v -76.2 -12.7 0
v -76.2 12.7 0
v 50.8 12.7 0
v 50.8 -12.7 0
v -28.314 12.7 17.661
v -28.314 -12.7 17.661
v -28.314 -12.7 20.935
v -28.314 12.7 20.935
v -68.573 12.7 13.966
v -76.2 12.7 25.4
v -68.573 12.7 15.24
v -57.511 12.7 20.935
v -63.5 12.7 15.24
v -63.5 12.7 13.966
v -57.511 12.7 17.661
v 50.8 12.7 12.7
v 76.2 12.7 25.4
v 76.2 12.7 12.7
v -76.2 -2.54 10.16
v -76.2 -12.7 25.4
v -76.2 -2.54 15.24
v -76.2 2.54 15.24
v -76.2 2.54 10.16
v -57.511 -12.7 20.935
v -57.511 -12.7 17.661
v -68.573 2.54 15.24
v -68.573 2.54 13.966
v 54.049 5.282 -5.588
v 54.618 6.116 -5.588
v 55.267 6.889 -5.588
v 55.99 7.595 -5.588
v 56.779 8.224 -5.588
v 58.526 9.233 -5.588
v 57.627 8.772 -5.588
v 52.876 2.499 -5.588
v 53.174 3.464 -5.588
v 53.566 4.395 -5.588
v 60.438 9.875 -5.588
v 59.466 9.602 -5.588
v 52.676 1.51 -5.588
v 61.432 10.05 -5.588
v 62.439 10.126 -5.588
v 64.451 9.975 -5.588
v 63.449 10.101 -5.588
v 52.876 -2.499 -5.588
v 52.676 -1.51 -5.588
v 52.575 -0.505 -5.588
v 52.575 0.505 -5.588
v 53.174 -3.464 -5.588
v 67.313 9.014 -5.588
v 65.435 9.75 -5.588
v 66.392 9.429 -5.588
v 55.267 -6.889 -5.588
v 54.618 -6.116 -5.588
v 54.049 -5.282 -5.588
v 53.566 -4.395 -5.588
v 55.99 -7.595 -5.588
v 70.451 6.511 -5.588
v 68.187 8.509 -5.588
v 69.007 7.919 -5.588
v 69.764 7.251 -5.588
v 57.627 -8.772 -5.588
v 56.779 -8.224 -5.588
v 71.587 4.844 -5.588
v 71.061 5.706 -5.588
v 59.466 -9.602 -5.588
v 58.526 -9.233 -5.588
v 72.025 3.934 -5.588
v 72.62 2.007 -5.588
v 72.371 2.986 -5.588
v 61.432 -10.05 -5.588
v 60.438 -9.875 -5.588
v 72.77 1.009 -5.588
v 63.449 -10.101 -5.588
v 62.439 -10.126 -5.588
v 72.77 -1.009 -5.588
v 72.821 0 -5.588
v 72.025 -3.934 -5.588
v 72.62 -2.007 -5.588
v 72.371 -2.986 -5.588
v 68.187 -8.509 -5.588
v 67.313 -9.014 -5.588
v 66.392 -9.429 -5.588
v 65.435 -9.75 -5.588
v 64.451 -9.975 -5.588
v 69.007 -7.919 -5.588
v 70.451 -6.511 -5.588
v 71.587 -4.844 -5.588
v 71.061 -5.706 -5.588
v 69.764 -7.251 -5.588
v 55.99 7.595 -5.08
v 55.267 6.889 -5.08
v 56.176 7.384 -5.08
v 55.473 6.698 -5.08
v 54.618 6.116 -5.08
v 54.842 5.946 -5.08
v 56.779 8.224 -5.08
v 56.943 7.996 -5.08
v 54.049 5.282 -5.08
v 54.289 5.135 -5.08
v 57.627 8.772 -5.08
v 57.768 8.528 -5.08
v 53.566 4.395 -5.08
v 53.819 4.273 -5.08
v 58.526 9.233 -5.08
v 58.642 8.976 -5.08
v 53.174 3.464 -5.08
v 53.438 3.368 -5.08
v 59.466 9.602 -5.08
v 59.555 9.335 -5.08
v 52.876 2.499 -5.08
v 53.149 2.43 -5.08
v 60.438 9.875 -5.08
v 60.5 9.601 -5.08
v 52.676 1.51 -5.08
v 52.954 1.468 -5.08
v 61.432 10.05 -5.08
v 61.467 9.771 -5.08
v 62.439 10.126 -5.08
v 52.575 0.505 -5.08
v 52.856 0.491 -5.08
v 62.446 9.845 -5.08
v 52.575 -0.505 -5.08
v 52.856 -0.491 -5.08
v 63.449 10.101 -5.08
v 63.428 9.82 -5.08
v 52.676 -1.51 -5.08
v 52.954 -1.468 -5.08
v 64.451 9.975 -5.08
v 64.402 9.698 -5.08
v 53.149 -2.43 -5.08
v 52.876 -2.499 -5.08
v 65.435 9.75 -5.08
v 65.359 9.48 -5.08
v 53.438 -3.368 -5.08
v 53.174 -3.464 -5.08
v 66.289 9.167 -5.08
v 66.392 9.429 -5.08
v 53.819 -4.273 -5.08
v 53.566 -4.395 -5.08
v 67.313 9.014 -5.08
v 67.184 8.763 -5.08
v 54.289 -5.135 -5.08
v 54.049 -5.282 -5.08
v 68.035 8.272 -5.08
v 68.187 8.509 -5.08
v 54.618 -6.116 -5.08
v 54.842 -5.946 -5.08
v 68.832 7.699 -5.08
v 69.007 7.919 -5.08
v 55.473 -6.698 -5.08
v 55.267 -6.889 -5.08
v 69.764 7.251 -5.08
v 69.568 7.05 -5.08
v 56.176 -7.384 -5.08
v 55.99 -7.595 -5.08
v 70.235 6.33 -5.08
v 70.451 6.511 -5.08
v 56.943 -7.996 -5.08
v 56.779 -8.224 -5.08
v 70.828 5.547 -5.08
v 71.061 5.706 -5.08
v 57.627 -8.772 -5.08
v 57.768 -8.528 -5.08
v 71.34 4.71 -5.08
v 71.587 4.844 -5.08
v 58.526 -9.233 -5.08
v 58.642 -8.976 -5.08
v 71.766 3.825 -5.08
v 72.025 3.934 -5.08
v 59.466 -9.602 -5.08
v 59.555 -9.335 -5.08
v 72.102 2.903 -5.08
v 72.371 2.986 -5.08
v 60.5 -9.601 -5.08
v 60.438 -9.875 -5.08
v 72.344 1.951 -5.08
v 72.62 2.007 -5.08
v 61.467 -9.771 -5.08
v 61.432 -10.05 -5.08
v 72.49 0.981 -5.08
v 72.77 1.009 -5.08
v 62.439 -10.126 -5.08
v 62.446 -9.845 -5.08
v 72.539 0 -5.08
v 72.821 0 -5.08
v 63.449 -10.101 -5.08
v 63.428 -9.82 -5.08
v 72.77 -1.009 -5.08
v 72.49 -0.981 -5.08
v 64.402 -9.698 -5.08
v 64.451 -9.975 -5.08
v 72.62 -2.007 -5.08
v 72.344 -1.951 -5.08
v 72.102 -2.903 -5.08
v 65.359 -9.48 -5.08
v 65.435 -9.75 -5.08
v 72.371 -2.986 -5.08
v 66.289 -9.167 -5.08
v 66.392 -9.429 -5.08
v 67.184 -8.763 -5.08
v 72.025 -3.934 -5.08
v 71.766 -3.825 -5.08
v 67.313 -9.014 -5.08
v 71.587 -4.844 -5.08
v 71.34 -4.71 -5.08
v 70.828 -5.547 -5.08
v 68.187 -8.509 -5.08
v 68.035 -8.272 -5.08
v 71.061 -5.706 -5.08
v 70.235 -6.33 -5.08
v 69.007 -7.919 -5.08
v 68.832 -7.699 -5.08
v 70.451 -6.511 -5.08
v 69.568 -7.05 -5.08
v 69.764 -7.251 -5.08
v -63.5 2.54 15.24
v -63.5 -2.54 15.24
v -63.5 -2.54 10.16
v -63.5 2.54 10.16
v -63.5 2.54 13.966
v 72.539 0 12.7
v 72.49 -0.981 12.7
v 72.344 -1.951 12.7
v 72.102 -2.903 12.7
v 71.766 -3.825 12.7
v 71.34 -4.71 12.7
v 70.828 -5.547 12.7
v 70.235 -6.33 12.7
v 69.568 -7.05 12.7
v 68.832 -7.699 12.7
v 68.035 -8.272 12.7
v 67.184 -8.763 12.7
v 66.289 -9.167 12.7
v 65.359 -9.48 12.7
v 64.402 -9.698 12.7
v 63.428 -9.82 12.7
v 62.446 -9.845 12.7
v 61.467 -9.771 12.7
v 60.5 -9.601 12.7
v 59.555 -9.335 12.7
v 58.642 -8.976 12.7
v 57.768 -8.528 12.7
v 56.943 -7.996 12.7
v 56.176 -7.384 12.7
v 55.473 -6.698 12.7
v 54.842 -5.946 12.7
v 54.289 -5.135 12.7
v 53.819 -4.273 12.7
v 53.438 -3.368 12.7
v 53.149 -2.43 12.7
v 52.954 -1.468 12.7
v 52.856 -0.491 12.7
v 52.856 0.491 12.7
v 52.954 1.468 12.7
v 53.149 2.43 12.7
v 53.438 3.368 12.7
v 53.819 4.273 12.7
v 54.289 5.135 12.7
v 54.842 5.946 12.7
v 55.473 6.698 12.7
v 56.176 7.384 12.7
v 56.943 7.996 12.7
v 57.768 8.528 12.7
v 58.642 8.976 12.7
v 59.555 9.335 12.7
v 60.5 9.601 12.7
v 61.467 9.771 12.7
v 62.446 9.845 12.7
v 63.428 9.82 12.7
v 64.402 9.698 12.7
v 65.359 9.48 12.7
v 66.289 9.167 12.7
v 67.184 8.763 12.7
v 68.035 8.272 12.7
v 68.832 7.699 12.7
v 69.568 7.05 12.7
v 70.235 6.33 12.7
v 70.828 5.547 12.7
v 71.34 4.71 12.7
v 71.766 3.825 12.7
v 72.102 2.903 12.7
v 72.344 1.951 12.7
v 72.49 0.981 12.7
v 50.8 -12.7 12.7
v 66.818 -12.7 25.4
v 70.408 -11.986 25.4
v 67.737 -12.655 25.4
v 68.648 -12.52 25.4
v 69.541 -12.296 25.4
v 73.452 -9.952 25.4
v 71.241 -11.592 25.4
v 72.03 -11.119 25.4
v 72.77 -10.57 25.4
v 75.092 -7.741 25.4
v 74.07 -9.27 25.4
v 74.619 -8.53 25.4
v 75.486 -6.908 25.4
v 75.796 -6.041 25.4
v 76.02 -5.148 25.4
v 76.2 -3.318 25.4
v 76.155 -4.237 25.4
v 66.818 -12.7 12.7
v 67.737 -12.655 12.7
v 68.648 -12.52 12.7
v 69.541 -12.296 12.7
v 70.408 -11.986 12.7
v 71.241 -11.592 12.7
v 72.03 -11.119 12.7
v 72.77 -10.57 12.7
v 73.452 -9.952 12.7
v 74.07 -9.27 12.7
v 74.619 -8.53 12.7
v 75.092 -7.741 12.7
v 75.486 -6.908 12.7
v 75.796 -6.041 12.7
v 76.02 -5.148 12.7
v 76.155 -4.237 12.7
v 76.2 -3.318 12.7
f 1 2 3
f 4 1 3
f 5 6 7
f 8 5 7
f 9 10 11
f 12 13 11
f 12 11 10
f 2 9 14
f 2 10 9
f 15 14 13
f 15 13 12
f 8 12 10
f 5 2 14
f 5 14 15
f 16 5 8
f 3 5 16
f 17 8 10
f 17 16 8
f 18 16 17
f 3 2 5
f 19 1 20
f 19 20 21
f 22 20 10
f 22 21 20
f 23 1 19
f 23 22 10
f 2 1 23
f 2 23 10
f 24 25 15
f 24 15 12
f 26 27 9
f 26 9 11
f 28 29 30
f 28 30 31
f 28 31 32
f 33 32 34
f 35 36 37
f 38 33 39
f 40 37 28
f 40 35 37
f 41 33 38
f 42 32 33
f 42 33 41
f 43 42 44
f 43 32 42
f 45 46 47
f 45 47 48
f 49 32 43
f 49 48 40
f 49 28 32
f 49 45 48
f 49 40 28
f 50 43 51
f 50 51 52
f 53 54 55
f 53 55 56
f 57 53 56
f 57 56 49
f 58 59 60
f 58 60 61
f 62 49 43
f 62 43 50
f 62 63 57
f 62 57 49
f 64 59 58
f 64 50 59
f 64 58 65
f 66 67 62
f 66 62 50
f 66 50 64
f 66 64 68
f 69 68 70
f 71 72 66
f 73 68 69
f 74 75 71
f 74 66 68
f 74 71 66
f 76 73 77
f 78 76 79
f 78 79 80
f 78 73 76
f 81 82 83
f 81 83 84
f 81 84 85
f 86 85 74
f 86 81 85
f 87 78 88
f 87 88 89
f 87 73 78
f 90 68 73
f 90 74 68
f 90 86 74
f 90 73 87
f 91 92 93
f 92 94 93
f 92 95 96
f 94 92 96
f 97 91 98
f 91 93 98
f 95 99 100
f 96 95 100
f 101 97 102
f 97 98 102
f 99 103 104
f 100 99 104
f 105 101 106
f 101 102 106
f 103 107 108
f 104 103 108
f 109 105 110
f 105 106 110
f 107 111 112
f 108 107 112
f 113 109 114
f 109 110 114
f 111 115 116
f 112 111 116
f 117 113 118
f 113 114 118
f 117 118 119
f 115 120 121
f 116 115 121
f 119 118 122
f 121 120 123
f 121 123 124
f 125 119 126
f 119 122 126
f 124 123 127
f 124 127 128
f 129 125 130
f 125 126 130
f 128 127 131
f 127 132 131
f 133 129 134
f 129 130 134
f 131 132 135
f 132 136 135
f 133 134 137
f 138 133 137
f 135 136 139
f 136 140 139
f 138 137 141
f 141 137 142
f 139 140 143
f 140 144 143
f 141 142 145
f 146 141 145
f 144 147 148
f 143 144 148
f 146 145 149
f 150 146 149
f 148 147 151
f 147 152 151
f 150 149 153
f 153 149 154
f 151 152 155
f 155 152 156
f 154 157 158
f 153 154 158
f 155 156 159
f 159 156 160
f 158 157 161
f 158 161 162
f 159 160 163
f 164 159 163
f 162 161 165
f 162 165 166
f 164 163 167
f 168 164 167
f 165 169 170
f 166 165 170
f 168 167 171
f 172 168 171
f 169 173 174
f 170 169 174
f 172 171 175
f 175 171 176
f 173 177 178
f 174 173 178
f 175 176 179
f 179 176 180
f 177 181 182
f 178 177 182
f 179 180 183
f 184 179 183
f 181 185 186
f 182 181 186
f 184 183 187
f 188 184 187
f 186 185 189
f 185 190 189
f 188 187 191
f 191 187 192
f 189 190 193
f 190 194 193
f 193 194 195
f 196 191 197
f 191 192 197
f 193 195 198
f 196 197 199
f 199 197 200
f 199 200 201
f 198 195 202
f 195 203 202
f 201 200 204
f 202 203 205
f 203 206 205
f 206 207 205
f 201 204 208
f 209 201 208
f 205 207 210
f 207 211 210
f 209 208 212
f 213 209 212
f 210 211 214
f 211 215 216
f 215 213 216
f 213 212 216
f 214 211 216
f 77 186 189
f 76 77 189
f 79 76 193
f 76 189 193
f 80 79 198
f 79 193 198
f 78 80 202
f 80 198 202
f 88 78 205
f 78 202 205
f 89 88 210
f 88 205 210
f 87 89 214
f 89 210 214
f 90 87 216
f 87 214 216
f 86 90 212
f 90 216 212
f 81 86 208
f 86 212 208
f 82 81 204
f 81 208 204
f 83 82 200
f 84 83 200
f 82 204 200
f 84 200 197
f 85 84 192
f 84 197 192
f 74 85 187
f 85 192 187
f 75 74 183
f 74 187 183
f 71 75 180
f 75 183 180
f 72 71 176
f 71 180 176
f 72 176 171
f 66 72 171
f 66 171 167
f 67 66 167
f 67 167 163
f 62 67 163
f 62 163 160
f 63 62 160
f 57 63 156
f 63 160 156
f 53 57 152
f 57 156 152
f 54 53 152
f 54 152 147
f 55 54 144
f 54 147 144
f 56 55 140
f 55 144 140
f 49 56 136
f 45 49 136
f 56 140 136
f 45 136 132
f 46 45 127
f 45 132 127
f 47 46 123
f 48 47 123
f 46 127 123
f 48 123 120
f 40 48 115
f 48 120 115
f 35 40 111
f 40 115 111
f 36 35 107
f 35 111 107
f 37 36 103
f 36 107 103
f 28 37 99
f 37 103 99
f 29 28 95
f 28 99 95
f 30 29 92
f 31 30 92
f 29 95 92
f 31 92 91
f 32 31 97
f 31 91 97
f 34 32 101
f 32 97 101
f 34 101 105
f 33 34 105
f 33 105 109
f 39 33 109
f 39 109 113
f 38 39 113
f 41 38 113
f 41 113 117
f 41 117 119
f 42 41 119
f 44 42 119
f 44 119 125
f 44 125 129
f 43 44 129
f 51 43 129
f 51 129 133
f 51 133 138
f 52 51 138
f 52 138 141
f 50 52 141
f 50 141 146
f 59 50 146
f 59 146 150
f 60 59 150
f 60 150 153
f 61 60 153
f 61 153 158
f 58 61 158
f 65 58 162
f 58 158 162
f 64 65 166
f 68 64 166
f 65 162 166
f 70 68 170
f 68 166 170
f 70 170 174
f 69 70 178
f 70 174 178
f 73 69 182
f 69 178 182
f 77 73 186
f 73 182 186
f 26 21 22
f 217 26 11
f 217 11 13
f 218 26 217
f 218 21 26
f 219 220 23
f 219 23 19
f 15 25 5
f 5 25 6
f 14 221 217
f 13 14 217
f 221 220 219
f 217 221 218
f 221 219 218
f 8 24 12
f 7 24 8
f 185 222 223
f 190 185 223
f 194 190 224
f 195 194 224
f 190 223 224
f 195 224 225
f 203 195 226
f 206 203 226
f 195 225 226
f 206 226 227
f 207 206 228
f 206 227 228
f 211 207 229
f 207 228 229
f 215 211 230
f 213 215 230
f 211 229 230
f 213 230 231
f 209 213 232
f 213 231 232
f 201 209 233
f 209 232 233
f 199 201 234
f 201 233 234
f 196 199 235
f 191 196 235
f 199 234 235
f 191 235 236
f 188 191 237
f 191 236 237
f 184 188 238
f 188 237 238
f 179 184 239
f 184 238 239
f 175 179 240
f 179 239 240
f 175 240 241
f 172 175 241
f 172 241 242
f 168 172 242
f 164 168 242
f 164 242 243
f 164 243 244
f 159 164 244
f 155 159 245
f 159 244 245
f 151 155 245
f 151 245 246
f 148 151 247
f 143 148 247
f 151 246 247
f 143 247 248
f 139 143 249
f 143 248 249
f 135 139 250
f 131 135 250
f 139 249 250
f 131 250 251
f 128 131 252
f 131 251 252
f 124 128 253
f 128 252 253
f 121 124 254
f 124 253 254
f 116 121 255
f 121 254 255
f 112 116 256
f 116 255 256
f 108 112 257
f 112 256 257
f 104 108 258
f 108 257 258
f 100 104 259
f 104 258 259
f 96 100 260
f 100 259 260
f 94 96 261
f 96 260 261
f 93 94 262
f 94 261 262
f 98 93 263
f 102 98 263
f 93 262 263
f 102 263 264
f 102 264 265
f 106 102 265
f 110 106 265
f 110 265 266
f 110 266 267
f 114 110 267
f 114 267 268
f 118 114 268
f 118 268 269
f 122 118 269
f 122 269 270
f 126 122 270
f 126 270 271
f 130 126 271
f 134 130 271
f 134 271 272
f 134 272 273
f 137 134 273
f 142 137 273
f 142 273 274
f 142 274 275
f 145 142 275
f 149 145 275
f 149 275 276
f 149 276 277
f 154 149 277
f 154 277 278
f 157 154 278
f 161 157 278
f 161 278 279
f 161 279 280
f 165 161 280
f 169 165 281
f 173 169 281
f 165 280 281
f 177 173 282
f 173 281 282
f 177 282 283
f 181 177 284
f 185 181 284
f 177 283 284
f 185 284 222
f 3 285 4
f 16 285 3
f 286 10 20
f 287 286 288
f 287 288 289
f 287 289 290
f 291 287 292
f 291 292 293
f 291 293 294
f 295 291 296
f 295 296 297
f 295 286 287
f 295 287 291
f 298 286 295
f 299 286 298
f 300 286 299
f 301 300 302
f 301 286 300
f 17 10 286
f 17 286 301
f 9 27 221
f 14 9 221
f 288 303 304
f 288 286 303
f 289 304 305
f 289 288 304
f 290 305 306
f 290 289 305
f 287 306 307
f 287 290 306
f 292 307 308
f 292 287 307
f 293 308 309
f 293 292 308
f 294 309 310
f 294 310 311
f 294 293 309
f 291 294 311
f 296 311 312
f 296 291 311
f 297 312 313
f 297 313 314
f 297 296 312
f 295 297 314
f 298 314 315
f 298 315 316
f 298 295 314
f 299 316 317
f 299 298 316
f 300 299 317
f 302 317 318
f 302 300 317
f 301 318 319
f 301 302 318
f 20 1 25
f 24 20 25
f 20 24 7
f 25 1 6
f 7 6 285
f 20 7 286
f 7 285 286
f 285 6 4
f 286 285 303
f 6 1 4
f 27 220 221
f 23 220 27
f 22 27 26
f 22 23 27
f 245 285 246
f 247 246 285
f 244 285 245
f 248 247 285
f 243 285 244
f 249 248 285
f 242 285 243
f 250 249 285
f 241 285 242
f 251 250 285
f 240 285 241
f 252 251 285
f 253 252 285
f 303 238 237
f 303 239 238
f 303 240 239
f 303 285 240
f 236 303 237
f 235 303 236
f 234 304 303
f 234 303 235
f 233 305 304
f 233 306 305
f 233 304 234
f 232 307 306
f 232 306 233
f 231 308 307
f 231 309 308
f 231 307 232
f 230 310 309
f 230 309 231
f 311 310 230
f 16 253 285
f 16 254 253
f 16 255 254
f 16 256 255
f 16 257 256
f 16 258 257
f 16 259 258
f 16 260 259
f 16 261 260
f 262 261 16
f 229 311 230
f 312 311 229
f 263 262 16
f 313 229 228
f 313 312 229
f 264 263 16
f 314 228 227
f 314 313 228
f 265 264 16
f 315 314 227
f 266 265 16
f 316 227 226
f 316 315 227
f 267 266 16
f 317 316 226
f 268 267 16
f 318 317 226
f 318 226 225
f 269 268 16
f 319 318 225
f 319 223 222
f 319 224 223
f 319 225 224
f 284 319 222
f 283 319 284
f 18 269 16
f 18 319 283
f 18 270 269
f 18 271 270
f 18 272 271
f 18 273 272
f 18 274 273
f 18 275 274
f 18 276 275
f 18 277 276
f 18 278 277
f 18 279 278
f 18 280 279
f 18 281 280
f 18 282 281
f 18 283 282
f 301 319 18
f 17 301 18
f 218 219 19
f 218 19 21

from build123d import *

# Parameters (mm, degrees)
F0_W       = 152.4
F0_H       = 25.4
F1_DEPTH   = 25.4
F2_W       = 25.4
F2_H       = 16.7976804078
F4_DEPTH   = 3.4544
F5_W       = 25.4
F5_H       = 12.7
F6_DEPTH   = 25.4
F8_W       = 29.1976537555
F8_H       = 3.2747276127
F9_DEPTH   = 25.4
F10_R      = 9.3821167461
F7_R       = 9.84758
F11_DEPTH  = 17.78
F12_R      = 10.1290006818
F12_R_2    = 9.84758
F11_FACE_R = 9.84758
F13_DEPTH  = 0.508
F14_W      = 5.08
F14_H      = 5.08
F15_DEPTH  = 12.7
F16_W      = 5.0729980469
F16_H      = 1.2744938934
F17_DEPTH  = 12.7


with BuildPart() as f1:
    # F0 (on Top) → F1 (new body)
    with BuildSketch(Plane.XY):
        Rectangle(F0_W, F0_H)
    extrude(amount=F1_DEPTH)

    # F2 (on face) → F4 (join)
    with BuildSketch(Plane.YZ.offset(76.2)):
        with Locations((0, 8.3988402039)):
            Rectangle(F2_W, F2_H)
    extrude(amount=-F4_DEPTH)

    # F5 (on face) → F6 (cut)
    with BuildSketch(Plane.YZ.offset(76.2)):
        with Locations((0, 6.35)):
            Rectangle(F5_W, F5_H)
    extrude(amount=-F6_DEPTH, mode=Mode.SUBTRACT)

    # F8 (on face) → F9 (cut)
    with BuildSketch(Plane.XZ.offset(12.7)):
        with Locations((-42.9124059156, 19.2979779094)):
            Rectangle(F8_W, F8_H)
    extrude(amount=-F9_DEPTH, mode=Mode.SUBTRACT)

    # F10
    f10_edges = [f1.edges().sort_by_distance(p)[0] for p in [
        (76.2, -12.7, 19.05),
    ]]
    fillet(f10_edges, radius=F10_R)

    # F7 (on face) → F11 (join)
    with BuildSketch(Plane(origin=(0, 0, 12.7), x_dir=(1, 0, 0), z_dir=(0, 0, -1))):
        with Locations((62.6917358843, 0)):
            Circle(F7_R)
    extrude(amount=F11_DEPTH)

    # F12 (on face) + F11_face (on face) → F13 (join)
    with BuildSketch(Plane(origin=(0, 0, -5.08), x_dir=(1, 0, 0), z_dir=(0, 0, -1))):
        with Locations((62.6917358843, 0)):
            Circle(F12_R)
        with Locations((62.6917358843, 0)):
            Circle(F12_R_2, mode=Mode.SUBTRACT)
        with Locations((62.6917358843, 0)):
            Circle(F12_R_2)
    with BuildSketch(Plane(origin=(62.6917358843, 0, -5.08), x_dir=(1, 0, 0), z_dir=(0, 0, -1))):
        Circle(F11_FACE_R)
    extrude(amount=F13_DEPTH)

    # F14 (on face) → F15 (cut)
    with BuildSketch(Plane(origin=(-76.2, 0, 0), x_dir=(0, -1, 0), z_dir=(-1, 0, 0))):
        with Locations((0, 12.7)):
            Rectangle(F14_W, F14_H)
    extrude(amount=-F15_DEPTH, mode=Mode.SUBTRACT)

    # F16 (on face) → F17 (cut)
    with BuildSketch(Plane.XZ.offset(-2.54)):
        with Locations((-66.0364990234, 14.6027530533)):
            Rectangle(F16_W, F16_H)
    extrude(amount=-F17_DEPTH, mode=Mode.SUBTRACT)


solid = f1.part
